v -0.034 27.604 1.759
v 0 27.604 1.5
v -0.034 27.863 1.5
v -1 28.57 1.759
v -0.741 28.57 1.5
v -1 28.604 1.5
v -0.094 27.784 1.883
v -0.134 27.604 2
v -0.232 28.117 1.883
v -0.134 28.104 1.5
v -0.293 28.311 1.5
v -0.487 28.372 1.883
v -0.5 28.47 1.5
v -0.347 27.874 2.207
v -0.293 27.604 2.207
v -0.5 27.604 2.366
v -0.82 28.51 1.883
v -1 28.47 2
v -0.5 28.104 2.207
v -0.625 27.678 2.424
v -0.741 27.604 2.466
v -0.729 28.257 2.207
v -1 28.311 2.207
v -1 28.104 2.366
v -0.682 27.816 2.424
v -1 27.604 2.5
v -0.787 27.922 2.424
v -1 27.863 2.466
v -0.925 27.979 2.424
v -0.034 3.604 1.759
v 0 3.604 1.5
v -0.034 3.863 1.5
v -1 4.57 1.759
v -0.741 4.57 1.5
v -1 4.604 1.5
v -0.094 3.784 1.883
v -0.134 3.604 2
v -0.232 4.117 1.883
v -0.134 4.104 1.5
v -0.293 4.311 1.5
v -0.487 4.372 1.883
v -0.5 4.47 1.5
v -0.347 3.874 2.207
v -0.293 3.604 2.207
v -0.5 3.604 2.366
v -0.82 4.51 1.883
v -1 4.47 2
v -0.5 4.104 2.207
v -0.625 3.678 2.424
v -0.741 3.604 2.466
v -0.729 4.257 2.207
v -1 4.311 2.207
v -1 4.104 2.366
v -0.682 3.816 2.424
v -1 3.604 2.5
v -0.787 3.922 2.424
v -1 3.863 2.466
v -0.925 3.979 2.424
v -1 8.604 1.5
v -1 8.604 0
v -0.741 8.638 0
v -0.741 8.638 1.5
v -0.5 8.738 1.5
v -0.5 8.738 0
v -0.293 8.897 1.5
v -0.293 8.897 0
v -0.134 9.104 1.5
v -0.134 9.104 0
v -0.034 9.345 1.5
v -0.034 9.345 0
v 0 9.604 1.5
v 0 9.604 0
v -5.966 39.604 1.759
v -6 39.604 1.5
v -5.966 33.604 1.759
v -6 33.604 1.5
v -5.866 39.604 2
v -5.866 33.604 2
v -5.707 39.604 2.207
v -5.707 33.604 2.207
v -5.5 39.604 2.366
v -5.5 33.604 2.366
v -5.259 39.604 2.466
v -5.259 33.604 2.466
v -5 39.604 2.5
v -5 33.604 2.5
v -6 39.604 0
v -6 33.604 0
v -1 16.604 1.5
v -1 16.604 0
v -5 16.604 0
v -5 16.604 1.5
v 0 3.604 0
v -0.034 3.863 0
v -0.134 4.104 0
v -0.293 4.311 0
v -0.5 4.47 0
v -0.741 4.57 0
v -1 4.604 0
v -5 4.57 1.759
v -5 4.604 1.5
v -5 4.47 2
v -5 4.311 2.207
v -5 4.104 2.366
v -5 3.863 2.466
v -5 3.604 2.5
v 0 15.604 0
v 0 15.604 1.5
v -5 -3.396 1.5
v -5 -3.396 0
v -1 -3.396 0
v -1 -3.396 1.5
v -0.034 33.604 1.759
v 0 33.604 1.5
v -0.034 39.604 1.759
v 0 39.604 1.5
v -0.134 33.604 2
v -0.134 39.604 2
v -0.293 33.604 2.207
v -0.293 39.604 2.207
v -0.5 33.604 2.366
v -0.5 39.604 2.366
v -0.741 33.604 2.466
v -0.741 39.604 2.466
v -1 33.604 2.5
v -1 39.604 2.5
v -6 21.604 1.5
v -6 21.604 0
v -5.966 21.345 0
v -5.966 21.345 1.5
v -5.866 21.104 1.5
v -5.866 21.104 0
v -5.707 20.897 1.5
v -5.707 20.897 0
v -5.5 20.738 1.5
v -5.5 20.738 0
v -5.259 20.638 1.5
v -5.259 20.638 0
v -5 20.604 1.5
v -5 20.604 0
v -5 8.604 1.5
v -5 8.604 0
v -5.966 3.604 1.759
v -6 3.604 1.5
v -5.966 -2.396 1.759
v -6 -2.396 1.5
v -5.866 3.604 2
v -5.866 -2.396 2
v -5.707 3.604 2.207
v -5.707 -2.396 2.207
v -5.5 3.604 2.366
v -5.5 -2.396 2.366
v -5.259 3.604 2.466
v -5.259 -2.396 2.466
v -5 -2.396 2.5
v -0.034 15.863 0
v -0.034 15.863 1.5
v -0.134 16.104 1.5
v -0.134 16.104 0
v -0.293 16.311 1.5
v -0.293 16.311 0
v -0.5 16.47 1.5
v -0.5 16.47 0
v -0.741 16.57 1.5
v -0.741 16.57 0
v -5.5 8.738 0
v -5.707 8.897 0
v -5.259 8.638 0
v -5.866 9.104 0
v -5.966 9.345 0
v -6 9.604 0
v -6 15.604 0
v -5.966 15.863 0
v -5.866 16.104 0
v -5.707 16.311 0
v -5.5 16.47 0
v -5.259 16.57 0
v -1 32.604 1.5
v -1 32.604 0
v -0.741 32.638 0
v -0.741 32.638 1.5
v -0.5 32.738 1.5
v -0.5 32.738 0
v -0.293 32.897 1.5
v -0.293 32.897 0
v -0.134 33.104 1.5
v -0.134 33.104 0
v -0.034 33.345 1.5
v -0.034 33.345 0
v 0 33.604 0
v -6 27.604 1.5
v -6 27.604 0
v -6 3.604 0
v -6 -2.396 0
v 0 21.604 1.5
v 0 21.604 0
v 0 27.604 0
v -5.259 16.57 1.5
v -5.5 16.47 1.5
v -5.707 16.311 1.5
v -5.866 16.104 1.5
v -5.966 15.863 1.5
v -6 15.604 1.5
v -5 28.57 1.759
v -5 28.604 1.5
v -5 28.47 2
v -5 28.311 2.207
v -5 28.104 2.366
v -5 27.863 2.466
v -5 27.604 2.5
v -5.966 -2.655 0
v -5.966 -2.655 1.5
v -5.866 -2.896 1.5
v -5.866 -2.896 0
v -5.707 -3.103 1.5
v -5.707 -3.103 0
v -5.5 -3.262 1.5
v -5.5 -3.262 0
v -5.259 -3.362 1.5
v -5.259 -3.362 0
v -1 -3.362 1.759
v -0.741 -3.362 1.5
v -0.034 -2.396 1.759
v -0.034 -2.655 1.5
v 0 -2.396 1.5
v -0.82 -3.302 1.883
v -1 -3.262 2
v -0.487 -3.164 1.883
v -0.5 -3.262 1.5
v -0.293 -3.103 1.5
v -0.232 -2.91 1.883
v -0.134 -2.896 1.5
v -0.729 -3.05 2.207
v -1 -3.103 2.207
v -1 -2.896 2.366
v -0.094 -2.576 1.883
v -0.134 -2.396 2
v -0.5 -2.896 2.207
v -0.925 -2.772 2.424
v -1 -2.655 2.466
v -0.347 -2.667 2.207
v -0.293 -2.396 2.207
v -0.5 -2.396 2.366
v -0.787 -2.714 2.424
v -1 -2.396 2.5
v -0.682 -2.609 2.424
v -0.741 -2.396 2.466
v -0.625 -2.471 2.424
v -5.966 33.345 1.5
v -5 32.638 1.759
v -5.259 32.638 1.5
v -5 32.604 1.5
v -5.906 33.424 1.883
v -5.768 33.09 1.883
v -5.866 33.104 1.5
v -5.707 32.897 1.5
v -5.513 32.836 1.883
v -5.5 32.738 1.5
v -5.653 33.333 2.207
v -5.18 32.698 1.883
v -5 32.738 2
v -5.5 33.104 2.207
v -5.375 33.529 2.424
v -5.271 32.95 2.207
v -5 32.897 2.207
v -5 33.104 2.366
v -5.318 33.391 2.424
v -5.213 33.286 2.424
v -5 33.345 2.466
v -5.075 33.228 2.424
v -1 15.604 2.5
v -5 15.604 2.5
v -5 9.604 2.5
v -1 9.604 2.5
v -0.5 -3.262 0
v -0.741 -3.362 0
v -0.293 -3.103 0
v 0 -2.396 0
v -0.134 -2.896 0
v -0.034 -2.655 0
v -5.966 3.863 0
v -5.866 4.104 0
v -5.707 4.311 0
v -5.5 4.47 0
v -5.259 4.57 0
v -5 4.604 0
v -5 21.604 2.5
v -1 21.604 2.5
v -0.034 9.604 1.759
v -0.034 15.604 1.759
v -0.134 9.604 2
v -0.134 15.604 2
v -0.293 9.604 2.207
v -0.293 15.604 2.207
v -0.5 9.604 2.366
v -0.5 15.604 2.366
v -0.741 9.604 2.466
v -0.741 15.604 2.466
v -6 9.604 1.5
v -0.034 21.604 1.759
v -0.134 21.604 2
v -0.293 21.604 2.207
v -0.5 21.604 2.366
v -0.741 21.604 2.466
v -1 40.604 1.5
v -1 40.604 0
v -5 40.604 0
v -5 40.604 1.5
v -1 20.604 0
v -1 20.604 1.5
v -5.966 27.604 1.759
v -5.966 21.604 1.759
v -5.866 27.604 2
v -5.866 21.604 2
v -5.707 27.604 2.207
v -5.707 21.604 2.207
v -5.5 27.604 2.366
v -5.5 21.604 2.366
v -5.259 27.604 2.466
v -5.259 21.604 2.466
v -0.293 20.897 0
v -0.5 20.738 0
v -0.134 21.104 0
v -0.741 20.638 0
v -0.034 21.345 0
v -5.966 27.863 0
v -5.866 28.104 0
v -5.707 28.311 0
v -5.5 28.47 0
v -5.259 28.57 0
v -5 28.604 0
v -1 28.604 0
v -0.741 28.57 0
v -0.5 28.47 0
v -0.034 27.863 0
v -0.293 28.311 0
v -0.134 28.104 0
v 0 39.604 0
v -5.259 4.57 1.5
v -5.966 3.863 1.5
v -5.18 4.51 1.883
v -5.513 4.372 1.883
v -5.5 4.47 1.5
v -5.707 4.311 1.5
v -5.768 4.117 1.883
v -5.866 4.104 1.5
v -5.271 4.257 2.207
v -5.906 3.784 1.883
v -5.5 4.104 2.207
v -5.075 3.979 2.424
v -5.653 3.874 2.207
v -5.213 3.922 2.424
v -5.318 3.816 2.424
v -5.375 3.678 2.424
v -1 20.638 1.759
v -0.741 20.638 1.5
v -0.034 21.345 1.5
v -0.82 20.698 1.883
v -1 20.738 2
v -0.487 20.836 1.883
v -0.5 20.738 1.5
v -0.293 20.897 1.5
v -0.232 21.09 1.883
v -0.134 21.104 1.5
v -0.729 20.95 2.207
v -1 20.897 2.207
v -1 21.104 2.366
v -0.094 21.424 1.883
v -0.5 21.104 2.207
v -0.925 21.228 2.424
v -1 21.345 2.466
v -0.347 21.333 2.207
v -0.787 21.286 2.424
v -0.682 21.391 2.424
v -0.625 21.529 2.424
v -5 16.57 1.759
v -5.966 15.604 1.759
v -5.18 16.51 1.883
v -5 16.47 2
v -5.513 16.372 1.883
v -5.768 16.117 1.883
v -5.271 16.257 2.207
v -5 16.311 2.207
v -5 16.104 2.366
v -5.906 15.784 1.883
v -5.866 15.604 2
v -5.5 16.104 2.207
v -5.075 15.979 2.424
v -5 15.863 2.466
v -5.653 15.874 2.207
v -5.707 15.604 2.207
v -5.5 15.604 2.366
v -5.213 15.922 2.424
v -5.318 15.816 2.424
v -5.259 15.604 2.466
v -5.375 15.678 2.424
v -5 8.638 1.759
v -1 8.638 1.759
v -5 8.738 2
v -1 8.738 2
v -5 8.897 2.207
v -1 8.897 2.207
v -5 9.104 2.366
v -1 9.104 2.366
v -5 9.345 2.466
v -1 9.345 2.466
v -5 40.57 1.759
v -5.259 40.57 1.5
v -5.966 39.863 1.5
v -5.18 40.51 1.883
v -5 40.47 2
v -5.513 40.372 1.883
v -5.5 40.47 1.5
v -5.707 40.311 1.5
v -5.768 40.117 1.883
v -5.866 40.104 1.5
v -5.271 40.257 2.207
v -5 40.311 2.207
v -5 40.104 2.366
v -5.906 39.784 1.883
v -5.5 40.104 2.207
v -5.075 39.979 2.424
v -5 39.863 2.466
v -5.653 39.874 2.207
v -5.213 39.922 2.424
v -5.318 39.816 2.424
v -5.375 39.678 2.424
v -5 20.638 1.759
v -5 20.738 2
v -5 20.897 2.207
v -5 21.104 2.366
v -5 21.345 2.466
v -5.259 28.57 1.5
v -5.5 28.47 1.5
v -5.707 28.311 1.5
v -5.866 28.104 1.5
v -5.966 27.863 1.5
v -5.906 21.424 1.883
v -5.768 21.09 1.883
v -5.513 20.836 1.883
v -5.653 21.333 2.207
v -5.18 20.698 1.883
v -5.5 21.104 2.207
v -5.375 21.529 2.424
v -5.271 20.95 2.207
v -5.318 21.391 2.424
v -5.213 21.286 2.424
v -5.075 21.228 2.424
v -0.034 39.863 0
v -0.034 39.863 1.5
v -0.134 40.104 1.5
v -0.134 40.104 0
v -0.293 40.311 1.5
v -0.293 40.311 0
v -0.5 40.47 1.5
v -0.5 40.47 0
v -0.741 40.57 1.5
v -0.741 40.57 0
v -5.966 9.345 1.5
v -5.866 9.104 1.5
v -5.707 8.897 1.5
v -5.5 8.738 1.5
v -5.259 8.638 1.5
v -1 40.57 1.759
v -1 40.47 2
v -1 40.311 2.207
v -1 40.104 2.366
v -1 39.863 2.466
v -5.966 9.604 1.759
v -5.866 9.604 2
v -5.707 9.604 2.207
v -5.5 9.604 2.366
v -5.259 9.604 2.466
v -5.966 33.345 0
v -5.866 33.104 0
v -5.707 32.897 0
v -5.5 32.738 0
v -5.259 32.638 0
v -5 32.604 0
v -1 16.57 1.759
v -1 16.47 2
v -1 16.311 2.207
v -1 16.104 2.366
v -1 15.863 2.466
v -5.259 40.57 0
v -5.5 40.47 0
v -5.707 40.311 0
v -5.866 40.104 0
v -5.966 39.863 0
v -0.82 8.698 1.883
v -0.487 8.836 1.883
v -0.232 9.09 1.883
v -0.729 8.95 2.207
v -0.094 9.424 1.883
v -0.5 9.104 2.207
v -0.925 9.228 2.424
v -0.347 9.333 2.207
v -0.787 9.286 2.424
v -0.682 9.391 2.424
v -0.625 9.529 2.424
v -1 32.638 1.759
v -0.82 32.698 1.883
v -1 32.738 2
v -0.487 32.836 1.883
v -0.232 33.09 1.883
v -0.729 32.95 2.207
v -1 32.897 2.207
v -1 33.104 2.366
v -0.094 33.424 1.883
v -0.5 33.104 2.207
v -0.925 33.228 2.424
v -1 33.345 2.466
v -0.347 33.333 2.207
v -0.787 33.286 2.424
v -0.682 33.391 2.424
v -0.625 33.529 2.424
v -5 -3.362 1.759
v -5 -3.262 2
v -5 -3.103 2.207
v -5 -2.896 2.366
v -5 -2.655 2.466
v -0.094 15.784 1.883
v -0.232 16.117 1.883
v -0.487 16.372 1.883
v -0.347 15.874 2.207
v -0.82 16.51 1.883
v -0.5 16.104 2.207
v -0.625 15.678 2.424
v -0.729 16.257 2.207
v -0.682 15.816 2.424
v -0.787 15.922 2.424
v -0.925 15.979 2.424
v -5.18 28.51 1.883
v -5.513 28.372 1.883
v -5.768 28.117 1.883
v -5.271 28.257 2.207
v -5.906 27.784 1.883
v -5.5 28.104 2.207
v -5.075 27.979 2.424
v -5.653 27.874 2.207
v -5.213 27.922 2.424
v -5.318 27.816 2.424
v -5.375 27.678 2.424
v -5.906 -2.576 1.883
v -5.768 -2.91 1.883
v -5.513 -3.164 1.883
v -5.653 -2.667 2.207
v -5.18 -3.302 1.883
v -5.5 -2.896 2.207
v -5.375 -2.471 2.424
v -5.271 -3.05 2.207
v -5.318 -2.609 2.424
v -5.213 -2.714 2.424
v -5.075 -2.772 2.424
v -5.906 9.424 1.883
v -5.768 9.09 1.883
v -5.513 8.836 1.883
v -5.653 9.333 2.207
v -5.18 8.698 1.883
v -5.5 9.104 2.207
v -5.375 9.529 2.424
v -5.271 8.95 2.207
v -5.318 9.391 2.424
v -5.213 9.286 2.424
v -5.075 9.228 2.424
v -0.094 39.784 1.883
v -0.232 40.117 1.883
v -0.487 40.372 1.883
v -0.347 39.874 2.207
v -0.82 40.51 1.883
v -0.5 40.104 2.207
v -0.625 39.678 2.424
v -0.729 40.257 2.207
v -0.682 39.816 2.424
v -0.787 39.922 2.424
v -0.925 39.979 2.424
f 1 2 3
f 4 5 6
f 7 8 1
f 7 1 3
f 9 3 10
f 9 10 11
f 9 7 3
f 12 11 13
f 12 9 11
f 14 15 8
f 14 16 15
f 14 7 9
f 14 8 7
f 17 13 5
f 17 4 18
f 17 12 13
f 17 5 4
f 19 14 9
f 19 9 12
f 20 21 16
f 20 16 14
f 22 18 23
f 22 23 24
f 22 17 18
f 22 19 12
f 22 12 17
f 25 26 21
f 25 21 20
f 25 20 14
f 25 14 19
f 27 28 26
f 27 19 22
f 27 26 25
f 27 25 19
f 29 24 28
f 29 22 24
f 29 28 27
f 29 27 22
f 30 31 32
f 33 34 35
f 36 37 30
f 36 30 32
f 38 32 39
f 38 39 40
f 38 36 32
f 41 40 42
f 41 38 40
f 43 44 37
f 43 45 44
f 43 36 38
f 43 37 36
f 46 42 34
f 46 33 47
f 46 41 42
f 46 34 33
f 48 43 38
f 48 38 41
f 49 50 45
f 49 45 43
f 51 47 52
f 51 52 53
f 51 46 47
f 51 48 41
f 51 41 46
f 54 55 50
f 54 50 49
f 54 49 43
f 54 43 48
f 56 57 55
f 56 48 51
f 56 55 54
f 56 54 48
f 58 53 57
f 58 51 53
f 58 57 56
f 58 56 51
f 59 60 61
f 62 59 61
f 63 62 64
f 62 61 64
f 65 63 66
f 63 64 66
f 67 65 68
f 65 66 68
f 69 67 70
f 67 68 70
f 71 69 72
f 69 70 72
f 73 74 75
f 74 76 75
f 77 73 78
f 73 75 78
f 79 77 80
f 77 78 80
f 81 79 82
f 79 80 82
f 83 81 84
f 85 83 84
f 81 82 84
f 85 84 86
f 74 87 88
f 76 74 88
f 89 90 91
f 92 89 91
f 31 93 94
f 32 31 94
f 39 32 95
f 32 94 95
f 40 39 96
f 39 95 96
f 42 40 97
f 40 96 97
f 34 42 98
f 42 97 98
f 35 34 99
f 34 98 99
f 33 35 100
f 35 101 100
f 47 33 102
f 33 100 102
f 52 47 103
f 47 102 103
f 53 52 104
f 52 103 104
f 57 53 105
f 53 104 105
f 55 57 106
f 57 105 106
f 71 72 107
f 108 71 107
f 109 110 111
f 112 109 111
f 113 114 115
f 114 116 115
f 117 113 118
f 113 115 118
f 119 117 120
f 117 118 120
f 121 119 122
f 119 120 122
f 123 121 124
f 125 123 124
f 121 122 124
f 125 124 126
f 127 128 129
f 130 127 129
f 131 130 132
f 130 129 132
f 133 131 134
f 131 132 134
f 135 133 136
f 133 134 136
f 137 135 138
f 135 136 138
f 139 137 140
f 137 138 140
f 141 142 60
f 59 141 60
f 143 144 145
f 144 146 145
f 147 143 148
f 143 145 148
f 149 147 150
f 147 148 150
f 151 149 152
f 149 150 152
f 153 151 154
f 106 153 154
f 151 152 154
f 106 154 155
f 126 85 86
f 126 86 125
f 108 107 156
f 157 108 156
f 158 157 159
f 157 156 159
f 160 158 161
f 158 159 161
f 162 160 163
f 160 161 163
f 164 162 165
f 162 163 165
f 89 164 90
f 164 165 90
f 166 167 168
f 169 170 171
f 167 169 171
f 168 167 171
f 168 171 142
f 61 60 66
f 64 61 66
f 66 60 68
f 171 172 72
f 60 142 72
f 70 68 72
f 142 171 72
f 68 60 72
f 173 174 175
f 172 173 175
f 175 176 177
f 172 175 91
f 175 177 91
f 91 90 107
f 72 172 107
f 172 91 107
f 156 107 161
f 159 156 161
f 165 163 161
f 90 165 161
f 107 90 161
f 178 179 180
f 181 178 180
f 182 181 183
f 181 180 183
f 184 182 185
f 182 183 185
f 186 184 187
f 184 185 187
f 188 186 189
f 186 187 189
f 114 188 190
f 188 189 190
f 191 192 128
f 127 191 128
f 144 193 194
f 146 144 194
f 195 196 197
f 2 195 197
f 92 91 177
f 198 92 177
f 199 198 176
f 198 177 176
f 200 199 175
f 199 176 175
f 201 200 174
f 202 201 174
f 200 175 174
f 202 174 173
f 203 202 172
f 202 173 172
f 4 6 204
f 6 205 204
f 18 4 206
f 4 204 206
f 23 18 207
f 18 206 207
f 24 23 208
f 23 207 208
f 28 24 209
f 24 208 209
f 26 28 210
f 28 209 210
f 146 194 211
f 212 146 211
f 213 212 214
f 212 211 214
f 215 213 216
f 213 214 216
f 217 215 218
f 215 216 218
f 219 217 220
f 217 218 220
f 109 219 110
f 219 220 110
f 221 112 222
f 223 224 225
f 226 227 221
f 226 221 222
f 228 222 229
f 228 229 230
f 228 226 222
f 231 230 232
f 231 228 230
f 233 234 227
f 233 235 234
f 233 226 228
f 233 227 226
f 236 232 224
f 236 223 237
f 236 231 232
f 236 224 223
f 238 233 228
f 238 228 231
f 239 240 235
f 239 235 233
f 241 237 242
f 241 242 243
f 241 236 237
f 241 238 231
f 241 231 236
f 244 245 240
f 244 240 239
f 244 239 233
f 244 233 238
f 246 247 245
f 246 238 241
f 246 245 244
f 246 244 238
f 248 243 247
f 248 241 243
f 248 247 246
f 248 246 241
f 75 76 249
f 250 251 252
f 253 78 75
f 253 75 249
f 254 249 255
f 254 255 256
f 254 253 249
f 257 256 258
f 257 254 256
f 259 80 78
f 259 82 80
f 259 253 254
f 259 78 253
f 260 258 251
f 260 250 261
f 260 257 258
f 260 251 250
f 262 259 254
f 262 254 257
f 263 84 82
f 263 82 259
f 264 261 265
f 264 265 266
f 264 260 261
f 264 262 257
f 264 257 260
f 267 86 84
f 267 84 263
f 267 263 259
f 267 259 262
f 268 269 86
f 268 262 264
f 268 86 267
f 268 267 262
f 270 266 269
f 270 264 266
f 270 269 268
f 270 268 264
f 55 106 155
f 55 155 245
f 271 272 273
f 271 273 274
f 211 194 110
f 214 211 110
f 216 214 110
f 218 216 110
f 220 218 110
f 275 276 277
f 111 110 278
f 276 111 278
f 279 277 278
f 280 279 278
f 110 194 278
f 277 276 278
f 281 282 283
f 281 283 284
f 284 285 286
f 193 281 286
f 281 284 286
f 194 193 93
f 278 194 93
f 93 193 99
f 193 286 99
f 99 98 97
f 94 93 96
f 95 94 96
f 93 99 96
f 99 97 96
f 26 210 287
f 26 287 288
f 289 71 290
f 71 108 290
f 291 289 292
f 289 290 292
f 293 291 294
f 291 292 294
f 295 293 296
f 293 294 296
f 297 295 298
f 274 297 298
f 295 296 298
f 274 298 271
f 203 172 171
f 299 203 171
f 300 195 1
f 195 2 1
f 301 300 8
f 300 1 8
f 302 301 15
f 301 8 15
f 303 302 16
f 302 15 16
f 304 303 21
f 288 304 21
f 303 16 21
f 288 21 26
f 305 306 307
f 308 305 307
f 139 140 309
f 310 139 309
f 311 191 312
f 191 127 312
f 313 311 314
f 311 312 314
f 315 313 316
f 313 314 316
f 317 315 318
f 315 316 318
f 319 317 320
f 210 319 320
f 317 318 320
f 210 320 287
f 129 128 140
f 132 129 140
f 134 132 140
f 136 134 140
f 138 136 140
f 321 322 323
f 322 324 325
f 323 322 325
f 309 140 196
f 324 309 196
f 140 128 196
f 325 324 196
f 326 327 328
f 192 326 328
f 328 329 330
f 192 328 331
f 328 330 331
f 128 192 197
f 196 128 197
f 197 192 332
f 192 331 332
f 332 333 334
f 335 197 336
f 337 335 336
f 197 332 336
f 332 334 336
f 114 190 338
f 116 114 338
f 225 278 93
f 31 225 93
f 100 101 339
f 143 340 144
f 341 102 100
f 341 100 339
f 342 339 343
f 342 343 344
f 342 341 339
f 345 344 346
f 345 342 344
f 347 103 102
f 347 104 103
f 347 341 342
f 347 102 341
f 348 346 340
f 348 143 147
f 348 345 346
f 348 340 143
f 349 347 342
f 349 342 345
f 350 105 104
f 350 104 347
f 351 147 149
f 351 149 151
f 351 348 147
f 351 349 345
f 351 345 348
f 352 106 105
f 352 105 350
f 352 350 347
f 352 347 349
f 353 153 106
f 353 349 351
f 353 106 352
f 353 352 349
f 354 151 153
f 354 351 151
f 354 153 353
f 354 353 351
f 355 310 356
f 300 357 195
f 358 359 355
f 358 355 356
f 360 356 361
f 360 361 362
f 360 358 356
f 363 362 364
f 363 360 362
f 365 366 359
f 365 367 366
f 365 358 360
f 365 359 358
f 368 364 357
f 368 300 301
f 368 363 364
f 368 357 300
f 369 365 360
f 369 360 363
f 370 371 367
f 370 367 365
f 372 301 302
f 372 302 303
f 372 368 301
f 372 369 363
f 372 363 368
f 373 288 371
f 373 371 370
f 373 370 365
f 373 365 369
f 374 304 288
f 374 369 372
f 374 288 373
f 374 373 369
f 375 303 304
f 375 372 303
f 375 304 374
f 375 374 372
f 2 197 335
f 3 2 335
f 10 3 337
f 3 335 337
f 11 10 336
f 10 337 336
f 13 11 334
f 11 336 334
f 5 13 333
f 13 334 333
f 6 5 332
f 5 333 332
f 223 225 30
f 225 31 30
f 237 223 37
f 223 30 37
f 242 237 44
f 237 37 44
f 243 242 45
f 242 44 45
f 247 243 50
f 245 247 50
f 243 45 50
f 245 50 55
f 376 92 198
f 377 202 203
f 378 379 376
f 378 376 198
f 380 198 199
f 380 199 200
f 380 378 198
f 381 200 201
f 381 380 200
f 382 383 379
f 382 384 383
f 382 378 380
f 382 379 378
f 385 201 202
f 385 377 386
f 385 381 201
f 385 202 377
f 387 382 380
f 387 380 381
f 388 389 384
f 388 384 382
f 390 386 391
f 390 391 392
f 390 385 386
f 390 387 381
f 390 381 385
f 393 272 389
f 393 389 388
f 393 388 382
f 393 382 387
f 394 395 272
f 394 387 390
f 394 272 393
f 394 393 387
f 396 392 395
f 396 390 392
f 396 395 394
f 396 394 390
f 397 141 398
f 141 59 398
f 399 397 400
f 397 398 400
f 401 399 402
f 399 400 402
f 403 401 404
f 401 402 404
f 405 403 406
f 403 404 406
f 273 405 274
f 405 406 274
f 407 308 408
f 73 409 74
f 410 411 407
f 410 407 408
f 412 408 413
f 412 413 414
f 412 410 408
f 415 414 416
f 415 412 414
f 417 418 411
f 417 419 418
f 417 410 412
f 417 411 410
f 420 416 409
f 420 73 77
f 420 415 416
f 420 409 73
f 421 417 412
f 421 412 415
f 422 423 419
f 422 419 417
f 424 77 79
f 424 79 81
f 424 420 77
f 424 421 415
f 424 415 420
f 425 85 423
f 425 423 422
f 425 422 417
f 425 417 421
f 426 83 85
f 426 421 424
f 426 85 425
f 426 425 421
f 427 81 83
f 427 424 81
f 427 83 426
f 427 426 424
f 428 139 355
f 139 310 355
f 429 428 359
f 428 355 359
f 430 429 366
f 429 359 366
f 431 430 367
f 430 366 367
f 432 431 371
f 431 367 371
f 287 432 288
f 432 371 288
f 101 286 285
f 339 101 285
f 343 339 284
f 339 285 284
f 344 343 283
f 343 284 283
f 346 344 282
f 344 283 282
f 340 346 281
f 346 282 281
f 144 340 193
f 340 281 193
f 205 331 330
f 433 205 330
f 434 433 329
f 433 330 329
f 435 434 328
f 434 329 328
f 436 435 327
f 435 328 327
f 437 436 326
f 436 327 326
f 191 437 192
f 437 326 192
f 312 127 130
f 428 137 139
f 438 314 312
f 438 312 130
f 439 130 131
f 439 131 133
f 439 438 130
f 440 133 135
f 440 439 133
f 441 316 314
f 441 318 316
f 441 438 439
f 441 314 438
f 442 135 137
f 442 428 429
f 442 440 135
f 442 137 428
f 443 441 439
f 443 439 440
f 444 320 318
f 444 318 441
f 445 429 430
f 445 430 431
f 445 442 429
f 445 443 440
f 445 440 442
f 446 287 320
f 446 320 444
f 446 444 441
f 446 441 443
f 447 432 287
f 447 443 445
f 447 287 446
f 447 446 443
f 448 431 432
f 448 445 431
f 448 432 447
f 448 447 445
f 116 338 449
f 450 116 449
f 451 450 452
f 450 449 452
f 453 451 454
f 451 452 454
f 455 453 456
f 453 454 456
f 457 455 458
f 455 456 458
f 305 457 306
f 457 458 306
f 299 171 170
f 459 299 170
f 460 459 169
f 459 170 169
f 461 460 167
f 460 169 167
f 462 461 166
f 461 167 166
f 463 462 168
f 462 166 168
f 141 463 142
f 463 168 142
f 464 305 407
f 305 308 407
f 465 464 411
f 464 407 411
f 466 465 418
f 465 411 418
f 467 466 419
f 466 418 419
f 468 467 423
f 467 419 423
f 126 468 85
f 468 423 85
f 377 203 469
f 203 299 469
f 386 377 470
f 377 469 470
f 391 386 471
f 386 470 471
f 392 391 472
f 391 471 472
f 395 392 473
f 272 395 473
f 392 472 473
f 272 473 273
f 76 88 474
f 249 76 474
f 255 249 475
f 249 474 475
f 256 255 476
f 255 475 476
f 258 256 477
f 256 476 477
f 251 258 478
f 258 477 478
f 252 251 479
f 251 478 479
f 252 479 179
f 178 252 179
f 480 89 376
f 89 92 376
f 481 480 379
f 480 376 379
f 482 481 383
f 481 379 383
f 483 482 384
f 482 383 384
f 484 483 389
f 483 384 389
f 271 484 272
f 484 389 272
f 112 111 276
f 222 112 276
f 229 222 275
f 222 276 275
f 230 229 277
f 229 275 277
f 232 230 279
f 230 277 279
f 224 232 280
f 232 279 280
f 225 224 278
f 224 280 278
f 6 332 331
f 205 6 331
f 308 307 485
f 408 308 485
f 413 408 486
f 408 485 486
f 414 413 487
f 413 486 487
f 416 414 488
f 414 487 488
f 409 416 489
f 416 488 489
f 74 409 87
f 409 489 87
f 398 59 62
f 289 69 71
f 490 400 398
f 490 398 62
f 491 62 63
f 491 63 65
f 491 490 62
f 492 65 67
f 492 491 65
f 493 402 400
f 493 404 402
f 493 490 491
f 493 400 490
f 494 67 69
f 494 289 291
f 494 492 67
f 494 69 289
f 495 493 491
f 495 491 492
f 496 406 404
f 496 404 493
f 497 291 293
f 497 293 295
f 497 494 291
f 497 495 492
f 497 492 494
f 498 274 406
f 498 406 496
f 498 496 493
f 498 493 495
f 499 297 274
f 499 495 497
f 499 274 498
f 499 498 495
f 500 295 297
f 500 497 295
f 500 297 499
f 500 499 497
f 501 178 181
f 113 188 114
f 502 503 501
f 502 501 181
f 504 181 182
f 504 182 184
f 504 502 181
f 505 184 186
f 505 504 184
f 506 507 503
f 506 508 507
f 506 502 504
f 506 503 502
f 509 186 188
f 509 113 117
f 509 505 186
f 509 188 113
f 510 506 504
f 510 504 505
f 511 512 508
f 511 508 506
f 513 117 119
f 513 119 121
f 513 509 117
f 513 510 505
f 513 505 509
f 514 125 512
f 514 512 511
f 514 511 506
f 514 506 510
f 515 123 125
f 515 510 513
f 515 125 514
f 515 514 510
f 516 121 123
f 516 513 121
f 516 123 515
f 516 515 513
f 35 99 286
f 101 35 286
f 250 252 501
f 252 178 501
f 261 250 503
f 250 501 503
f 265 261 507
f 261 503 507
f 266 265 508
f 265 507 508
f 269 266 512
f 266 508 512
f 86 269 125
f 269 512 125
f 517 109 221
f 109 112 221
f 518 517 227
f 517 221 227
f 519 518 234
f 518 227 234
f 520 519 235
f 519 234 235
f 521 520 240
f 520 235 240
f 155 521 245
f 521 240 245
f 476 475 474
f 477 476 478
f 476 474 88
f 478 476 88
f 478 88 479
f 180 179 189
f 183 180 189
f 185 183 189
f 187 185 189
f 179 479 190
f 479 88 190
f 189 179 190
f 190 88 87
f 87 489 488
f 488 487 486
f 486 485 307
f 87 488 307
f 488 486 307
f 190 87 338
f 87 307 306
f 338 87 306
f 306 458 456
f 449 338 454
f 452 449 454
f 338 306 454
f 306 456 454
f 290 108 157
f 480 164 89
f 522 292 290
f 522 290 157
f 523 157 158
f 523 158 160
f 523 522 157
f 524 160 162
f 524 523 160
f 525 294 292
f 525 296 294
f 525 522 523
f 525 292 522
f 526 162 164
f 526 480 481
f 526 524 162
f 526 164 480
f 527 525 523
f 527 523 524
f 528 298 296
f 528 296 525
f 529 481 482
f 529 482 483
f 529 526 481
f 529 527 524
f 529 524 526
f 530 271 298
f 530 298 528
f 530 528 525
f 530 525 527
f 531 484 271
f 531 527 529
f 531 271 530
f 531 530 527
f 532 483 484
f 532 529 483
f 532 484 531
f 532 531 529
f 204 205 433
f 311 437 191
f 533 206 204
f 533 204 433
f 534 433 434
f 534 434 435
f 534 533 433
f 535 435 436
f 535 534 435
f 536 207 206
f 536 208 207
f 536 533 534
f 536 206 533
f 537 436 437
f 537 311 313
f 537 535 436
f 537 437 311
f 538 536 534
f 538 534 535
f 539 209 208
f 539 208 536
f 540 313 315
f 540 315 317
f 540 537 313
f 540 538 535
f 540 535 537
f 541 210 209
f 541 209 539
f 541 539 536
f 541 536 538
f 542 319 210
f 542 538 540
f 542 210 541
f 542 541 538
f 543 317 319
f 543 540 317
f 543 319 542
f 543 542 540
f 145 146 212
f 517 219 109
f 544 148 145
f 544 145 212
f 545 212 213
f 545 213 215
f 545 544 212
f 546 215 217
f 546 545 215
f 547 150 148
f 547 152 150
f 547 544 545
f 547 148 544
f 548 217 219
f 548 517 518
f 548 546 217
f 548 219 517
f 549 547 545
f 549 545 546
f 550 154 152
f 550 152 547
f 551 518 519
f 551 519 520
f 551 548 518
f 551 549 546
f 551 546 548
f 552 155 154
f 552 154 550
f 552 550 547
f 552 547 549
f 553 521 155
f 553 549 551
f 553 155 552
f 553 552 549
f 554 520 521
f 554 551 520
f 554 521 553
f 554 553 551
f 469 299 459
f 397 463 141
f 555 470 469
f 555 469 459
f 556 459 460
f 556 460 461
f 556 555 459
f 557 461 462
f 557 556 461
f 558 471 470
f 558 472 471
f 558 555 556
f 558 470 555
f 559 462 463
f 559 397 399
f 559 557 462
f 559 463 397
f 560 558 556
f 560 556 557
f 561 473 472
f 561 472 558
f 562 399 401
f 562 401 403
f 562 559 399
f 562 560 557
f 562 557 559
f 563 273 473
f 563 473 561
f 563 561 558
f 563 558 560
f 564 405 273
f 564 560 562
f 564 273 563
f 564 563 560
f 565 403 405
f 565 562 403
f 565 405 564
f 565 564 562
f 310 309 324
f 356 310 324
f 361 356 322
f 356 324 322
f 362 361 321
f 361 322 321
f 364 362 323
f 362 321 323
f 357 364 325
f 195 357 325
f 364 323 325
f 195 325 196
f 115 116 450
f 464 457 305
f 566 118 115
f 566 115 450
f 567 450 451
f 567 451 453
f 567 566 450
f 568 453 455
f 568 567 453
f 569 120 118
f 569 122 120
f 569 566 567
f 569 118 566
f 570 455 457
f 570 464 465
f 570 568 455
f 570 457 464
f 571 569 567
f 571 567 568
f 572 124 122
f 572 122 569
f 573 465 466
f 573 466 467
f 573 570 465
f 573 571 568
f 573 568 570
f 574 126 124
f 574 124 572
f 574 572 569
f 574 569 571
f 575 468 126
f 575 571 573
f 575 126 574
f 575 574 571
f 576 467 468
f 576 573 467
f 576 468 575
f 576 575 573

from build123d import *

# Parameters (mm, degrees)
F1_DEPTH = 2.5
F2_R     = 1
F2_2_R   = 1
F2_3_R   = 1
F2_4_R   = 1


with BuildPart() as f1:
    # F0 (on Top) → F1 (new body)
    with BuildSketch(Plane.XY):
        with BuildLine():
            Line((-1, 40.603768607), (-5, 40.603768607))
            ThreePointArc((-5, 40.603768607), (-5.7071067812, 40.3108753882), (-6, 39.603768607))
            Line((-6, 39.603768607), (-6, 33.603768607))
            ThreePointArc((-6, 33.603768607), (-5.7071067812, 32.8966618258), (-5, 32.603768607))
            Line((-5, 32.603768607), (-1, 32.603768607))
            ThreePointArc((-1, 32.603768607), (-0.2928932188, 32.8966618258), (0, 33.603768607))
            Line((0, 33.603768607), (0, 39.603768607))
            ThreePointArc((0, 39.603768607), (-0.2928932188, 40.3108753882), (-1, 40.603768607))
        make_face()
    extrude(amount=F1_DEPTH)

    # F2
    f2_edges = [f1.edges().sort_by_distance(p)[0] for p in [
        (-0.292893, 40.310875, 2.5),
        (-3, 40.603769, 2.5),
        (-5.707107, 40.310875, 2.5),
        (-6, 36.603769, 2.5),
        (-5.707107, 32.896662, 2.5),
        (-3, 32.603769, 2.5),
        (-0.292893, 32.896662, 2.5),
        (0, 36.603769, 2.5),
    ]]
    fillet(f2_edges, radius=F2_R)


with BuildPart() as f1b:
    # F0 (on Top) → F1, piece 2 (new body)
    with BuildSketch(Plane.XY):
        with BuildLine():
            Line((-1, 28.603768607), (-5, 28.603768607))
            ThreePointArc((-5, 28.603768607), (-5.7071067812, 28.3108753882), (-6, 27.603768607))
            Line((-6, 27.603768607), (-6, 21.603768607))
            ThreePointArc((-6, 21.603768607), (-5.7071067812, 20.8966618258), (-5, 20.603768607))
            Line((-5, 20.603768607), (-1, 20.603768607))
            ThreePointArc((-1, 20.603768607), (-0.2928932188, 20.8966618258), (0, 21.603768607))
            Line((0, 21.603768607), (0, 27.603768607))
            ThreePointArc((0, 27.603768607), (-0.2928932188, 28.3108753882), (-1, 28.603768607))
        make_face()
    extrude(amount=F1_DEPTH)

    # F2#2
    f2_2_edges = [f1b.edges().sort_by_distance(p)[0] for p in [
        (-3, 28.603769, 2.5),
        (-5.707107, 28.310875, 2.5),
        (-6, 24.603769, 2.5),
        (-5.707107, 20.896662, 2.5),
        (-3, 20.603769, 2.5),
        (-0.292893, 20.896662, 2.5),
        (0, 24.603769, 2.5),
        (-0.292893, 28.310875, 2.5),
    ]]
    fillet(f2_2_edges, radius=F2_2_R)


with BuildPart() as f1c:
    # F0 (on Top) → F1, piece 3 (new body)
    with BuildSketch(Plane.XY):
        with BuildLine():
            Line((-1, 16.603768607), (-5, 16.603768607))
            ThreePointArc((-5, 16.603768607), (-5.7071067812, 16.3108753882), (-6, 15.603768607))
            Line((-6, 15.603768607), (-6, 9.603768607))
            ThreePointArc((-6, 9.603768607), (-5.7071067812, 8.8966618258), (-5, 8.603768607))
            Line((-5, 8.603768607), (-1, 8.603768607))
            ThreePointArc((-1, 8.603768607), (-0.2928932188, 8.8966618258), (0, 9.603768607))
            Line((0, 9.603768607), (0, 15.603768607))
            ThreePointArc((0, 15.603768607), (-0.2928932188, 16.3108753882), (-1, 16.603768607))
        make_face()
    extrude(amount=F1_DEPTH)

    # F2#3
    f2_3_edges = [f1c.edges().sort_by_distance(p)[0] for p in [
        (-3, 16.603769, 2.5),
        (-5.707107, 16.310875, 2.5),
        (-6, 12.603769, 2.5),
        (-5.707107, 8.896662, 2.5),
        (-3, 8.603769, 2.5),
        (-0.292893, 8.896662, 2.5),
        (0, 12.603769, 2.5),
        (-0.292893, 16.310875, 2.5),
    ]]
    fillet(f2_3_edges, radius=F2_3_R)


with BuildPart() as f1d:
    # F0 (on Top) → F1, piece 4 (new body)
    with BuildSketch(Plane.XY):
        with BuildLine():
            Line((-1, 4.603768607), (-5, 4.603768607))
            ThreePointArc((-5, 4.603768607), (-5.7071067812, 4.3108753882), (-6, 3.603768607))
            Line((-6, 3.603768607), (-6, -2.396231393))
            ThreePointArc((-6, -2.396231393), (-5.7071067812, -3.1033381742), (-5, -3.396231393))
            Line((-5, -3.396231393), (-1, -3.396231393))
            ThreePointArc((-1, -3.396231393), (-0.2928932188, -3.1033381742), (0, -2.396231393))
            Line((0, -2.396231393), (0, 3.603768607))
            ThreePointArc((0, 3.603768607), (-0.2928932188, 4.3108753882), (-1, 4.603768607))
        make_face()
    extrude(amount=F1_DEPTH)

    # F2#4
    f2_4_edges = [f1d.edges().sort_by_distance(p)[0] for p in [
        (-3, 4.603769, 2.5),
        (-5.707107, 4.310875, 2.5),
        (-6, 0.603769, 2.5),
        (-5.707107, -3.103338, 2.5),
        (-3, -3.396231, 2.5),
        (-0.292893, -3.103338, 2.5),
        (0, 0.603769, 2.5),
        (-0.292893, 4.310875, 2.5),
    ]]
    fillet(f2_4_edges, radius=F2_4_R)


solid = Compound([f1.part, f1b.part, f1c.part, f1d.part])
